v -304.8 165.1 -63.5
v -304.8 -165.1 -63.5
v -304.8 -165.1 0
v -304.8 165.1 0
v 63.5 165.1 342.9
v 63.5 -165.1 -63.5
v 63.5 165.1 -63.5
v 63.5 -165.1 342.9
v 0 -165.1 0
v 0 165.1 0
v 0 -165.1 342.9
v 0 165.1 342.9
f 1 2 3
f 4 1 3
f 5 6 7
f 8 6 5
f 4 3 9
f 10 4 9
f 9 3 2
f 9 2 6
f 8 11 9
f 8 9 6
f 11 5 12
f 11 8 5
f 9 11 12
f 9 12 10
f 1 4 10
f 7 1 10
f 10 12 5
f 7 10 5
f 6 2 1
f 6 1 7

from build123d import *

# Parameters (mm, degrees)
F1_DEPTH = 165.1
F2_W     = 304.8
F2_H     = 63.5
F3_DEPTH = 330.2


with BuildPart() as f1:
    # F0 (on Front) → F1 (new body, symmetric)
    with BuildSketch(Plane.XZ):
        Polygon((0, 342.9), (0, 0), (0, -63.5), (63.5, -63.5), (63.5, 342.9), align=None)
    extrude(amount=F1_DEPTH, both=True)

    # F2 (on face) → F3 (join)
    with BuildSketch(Plane.XZ.offset(165.1)):
        with Locations((-152.4, -31.75)):
            Rectangle(F2_W, F2_H)
    extrude(amount=-F3_DEPTH)


solid = f1.part
